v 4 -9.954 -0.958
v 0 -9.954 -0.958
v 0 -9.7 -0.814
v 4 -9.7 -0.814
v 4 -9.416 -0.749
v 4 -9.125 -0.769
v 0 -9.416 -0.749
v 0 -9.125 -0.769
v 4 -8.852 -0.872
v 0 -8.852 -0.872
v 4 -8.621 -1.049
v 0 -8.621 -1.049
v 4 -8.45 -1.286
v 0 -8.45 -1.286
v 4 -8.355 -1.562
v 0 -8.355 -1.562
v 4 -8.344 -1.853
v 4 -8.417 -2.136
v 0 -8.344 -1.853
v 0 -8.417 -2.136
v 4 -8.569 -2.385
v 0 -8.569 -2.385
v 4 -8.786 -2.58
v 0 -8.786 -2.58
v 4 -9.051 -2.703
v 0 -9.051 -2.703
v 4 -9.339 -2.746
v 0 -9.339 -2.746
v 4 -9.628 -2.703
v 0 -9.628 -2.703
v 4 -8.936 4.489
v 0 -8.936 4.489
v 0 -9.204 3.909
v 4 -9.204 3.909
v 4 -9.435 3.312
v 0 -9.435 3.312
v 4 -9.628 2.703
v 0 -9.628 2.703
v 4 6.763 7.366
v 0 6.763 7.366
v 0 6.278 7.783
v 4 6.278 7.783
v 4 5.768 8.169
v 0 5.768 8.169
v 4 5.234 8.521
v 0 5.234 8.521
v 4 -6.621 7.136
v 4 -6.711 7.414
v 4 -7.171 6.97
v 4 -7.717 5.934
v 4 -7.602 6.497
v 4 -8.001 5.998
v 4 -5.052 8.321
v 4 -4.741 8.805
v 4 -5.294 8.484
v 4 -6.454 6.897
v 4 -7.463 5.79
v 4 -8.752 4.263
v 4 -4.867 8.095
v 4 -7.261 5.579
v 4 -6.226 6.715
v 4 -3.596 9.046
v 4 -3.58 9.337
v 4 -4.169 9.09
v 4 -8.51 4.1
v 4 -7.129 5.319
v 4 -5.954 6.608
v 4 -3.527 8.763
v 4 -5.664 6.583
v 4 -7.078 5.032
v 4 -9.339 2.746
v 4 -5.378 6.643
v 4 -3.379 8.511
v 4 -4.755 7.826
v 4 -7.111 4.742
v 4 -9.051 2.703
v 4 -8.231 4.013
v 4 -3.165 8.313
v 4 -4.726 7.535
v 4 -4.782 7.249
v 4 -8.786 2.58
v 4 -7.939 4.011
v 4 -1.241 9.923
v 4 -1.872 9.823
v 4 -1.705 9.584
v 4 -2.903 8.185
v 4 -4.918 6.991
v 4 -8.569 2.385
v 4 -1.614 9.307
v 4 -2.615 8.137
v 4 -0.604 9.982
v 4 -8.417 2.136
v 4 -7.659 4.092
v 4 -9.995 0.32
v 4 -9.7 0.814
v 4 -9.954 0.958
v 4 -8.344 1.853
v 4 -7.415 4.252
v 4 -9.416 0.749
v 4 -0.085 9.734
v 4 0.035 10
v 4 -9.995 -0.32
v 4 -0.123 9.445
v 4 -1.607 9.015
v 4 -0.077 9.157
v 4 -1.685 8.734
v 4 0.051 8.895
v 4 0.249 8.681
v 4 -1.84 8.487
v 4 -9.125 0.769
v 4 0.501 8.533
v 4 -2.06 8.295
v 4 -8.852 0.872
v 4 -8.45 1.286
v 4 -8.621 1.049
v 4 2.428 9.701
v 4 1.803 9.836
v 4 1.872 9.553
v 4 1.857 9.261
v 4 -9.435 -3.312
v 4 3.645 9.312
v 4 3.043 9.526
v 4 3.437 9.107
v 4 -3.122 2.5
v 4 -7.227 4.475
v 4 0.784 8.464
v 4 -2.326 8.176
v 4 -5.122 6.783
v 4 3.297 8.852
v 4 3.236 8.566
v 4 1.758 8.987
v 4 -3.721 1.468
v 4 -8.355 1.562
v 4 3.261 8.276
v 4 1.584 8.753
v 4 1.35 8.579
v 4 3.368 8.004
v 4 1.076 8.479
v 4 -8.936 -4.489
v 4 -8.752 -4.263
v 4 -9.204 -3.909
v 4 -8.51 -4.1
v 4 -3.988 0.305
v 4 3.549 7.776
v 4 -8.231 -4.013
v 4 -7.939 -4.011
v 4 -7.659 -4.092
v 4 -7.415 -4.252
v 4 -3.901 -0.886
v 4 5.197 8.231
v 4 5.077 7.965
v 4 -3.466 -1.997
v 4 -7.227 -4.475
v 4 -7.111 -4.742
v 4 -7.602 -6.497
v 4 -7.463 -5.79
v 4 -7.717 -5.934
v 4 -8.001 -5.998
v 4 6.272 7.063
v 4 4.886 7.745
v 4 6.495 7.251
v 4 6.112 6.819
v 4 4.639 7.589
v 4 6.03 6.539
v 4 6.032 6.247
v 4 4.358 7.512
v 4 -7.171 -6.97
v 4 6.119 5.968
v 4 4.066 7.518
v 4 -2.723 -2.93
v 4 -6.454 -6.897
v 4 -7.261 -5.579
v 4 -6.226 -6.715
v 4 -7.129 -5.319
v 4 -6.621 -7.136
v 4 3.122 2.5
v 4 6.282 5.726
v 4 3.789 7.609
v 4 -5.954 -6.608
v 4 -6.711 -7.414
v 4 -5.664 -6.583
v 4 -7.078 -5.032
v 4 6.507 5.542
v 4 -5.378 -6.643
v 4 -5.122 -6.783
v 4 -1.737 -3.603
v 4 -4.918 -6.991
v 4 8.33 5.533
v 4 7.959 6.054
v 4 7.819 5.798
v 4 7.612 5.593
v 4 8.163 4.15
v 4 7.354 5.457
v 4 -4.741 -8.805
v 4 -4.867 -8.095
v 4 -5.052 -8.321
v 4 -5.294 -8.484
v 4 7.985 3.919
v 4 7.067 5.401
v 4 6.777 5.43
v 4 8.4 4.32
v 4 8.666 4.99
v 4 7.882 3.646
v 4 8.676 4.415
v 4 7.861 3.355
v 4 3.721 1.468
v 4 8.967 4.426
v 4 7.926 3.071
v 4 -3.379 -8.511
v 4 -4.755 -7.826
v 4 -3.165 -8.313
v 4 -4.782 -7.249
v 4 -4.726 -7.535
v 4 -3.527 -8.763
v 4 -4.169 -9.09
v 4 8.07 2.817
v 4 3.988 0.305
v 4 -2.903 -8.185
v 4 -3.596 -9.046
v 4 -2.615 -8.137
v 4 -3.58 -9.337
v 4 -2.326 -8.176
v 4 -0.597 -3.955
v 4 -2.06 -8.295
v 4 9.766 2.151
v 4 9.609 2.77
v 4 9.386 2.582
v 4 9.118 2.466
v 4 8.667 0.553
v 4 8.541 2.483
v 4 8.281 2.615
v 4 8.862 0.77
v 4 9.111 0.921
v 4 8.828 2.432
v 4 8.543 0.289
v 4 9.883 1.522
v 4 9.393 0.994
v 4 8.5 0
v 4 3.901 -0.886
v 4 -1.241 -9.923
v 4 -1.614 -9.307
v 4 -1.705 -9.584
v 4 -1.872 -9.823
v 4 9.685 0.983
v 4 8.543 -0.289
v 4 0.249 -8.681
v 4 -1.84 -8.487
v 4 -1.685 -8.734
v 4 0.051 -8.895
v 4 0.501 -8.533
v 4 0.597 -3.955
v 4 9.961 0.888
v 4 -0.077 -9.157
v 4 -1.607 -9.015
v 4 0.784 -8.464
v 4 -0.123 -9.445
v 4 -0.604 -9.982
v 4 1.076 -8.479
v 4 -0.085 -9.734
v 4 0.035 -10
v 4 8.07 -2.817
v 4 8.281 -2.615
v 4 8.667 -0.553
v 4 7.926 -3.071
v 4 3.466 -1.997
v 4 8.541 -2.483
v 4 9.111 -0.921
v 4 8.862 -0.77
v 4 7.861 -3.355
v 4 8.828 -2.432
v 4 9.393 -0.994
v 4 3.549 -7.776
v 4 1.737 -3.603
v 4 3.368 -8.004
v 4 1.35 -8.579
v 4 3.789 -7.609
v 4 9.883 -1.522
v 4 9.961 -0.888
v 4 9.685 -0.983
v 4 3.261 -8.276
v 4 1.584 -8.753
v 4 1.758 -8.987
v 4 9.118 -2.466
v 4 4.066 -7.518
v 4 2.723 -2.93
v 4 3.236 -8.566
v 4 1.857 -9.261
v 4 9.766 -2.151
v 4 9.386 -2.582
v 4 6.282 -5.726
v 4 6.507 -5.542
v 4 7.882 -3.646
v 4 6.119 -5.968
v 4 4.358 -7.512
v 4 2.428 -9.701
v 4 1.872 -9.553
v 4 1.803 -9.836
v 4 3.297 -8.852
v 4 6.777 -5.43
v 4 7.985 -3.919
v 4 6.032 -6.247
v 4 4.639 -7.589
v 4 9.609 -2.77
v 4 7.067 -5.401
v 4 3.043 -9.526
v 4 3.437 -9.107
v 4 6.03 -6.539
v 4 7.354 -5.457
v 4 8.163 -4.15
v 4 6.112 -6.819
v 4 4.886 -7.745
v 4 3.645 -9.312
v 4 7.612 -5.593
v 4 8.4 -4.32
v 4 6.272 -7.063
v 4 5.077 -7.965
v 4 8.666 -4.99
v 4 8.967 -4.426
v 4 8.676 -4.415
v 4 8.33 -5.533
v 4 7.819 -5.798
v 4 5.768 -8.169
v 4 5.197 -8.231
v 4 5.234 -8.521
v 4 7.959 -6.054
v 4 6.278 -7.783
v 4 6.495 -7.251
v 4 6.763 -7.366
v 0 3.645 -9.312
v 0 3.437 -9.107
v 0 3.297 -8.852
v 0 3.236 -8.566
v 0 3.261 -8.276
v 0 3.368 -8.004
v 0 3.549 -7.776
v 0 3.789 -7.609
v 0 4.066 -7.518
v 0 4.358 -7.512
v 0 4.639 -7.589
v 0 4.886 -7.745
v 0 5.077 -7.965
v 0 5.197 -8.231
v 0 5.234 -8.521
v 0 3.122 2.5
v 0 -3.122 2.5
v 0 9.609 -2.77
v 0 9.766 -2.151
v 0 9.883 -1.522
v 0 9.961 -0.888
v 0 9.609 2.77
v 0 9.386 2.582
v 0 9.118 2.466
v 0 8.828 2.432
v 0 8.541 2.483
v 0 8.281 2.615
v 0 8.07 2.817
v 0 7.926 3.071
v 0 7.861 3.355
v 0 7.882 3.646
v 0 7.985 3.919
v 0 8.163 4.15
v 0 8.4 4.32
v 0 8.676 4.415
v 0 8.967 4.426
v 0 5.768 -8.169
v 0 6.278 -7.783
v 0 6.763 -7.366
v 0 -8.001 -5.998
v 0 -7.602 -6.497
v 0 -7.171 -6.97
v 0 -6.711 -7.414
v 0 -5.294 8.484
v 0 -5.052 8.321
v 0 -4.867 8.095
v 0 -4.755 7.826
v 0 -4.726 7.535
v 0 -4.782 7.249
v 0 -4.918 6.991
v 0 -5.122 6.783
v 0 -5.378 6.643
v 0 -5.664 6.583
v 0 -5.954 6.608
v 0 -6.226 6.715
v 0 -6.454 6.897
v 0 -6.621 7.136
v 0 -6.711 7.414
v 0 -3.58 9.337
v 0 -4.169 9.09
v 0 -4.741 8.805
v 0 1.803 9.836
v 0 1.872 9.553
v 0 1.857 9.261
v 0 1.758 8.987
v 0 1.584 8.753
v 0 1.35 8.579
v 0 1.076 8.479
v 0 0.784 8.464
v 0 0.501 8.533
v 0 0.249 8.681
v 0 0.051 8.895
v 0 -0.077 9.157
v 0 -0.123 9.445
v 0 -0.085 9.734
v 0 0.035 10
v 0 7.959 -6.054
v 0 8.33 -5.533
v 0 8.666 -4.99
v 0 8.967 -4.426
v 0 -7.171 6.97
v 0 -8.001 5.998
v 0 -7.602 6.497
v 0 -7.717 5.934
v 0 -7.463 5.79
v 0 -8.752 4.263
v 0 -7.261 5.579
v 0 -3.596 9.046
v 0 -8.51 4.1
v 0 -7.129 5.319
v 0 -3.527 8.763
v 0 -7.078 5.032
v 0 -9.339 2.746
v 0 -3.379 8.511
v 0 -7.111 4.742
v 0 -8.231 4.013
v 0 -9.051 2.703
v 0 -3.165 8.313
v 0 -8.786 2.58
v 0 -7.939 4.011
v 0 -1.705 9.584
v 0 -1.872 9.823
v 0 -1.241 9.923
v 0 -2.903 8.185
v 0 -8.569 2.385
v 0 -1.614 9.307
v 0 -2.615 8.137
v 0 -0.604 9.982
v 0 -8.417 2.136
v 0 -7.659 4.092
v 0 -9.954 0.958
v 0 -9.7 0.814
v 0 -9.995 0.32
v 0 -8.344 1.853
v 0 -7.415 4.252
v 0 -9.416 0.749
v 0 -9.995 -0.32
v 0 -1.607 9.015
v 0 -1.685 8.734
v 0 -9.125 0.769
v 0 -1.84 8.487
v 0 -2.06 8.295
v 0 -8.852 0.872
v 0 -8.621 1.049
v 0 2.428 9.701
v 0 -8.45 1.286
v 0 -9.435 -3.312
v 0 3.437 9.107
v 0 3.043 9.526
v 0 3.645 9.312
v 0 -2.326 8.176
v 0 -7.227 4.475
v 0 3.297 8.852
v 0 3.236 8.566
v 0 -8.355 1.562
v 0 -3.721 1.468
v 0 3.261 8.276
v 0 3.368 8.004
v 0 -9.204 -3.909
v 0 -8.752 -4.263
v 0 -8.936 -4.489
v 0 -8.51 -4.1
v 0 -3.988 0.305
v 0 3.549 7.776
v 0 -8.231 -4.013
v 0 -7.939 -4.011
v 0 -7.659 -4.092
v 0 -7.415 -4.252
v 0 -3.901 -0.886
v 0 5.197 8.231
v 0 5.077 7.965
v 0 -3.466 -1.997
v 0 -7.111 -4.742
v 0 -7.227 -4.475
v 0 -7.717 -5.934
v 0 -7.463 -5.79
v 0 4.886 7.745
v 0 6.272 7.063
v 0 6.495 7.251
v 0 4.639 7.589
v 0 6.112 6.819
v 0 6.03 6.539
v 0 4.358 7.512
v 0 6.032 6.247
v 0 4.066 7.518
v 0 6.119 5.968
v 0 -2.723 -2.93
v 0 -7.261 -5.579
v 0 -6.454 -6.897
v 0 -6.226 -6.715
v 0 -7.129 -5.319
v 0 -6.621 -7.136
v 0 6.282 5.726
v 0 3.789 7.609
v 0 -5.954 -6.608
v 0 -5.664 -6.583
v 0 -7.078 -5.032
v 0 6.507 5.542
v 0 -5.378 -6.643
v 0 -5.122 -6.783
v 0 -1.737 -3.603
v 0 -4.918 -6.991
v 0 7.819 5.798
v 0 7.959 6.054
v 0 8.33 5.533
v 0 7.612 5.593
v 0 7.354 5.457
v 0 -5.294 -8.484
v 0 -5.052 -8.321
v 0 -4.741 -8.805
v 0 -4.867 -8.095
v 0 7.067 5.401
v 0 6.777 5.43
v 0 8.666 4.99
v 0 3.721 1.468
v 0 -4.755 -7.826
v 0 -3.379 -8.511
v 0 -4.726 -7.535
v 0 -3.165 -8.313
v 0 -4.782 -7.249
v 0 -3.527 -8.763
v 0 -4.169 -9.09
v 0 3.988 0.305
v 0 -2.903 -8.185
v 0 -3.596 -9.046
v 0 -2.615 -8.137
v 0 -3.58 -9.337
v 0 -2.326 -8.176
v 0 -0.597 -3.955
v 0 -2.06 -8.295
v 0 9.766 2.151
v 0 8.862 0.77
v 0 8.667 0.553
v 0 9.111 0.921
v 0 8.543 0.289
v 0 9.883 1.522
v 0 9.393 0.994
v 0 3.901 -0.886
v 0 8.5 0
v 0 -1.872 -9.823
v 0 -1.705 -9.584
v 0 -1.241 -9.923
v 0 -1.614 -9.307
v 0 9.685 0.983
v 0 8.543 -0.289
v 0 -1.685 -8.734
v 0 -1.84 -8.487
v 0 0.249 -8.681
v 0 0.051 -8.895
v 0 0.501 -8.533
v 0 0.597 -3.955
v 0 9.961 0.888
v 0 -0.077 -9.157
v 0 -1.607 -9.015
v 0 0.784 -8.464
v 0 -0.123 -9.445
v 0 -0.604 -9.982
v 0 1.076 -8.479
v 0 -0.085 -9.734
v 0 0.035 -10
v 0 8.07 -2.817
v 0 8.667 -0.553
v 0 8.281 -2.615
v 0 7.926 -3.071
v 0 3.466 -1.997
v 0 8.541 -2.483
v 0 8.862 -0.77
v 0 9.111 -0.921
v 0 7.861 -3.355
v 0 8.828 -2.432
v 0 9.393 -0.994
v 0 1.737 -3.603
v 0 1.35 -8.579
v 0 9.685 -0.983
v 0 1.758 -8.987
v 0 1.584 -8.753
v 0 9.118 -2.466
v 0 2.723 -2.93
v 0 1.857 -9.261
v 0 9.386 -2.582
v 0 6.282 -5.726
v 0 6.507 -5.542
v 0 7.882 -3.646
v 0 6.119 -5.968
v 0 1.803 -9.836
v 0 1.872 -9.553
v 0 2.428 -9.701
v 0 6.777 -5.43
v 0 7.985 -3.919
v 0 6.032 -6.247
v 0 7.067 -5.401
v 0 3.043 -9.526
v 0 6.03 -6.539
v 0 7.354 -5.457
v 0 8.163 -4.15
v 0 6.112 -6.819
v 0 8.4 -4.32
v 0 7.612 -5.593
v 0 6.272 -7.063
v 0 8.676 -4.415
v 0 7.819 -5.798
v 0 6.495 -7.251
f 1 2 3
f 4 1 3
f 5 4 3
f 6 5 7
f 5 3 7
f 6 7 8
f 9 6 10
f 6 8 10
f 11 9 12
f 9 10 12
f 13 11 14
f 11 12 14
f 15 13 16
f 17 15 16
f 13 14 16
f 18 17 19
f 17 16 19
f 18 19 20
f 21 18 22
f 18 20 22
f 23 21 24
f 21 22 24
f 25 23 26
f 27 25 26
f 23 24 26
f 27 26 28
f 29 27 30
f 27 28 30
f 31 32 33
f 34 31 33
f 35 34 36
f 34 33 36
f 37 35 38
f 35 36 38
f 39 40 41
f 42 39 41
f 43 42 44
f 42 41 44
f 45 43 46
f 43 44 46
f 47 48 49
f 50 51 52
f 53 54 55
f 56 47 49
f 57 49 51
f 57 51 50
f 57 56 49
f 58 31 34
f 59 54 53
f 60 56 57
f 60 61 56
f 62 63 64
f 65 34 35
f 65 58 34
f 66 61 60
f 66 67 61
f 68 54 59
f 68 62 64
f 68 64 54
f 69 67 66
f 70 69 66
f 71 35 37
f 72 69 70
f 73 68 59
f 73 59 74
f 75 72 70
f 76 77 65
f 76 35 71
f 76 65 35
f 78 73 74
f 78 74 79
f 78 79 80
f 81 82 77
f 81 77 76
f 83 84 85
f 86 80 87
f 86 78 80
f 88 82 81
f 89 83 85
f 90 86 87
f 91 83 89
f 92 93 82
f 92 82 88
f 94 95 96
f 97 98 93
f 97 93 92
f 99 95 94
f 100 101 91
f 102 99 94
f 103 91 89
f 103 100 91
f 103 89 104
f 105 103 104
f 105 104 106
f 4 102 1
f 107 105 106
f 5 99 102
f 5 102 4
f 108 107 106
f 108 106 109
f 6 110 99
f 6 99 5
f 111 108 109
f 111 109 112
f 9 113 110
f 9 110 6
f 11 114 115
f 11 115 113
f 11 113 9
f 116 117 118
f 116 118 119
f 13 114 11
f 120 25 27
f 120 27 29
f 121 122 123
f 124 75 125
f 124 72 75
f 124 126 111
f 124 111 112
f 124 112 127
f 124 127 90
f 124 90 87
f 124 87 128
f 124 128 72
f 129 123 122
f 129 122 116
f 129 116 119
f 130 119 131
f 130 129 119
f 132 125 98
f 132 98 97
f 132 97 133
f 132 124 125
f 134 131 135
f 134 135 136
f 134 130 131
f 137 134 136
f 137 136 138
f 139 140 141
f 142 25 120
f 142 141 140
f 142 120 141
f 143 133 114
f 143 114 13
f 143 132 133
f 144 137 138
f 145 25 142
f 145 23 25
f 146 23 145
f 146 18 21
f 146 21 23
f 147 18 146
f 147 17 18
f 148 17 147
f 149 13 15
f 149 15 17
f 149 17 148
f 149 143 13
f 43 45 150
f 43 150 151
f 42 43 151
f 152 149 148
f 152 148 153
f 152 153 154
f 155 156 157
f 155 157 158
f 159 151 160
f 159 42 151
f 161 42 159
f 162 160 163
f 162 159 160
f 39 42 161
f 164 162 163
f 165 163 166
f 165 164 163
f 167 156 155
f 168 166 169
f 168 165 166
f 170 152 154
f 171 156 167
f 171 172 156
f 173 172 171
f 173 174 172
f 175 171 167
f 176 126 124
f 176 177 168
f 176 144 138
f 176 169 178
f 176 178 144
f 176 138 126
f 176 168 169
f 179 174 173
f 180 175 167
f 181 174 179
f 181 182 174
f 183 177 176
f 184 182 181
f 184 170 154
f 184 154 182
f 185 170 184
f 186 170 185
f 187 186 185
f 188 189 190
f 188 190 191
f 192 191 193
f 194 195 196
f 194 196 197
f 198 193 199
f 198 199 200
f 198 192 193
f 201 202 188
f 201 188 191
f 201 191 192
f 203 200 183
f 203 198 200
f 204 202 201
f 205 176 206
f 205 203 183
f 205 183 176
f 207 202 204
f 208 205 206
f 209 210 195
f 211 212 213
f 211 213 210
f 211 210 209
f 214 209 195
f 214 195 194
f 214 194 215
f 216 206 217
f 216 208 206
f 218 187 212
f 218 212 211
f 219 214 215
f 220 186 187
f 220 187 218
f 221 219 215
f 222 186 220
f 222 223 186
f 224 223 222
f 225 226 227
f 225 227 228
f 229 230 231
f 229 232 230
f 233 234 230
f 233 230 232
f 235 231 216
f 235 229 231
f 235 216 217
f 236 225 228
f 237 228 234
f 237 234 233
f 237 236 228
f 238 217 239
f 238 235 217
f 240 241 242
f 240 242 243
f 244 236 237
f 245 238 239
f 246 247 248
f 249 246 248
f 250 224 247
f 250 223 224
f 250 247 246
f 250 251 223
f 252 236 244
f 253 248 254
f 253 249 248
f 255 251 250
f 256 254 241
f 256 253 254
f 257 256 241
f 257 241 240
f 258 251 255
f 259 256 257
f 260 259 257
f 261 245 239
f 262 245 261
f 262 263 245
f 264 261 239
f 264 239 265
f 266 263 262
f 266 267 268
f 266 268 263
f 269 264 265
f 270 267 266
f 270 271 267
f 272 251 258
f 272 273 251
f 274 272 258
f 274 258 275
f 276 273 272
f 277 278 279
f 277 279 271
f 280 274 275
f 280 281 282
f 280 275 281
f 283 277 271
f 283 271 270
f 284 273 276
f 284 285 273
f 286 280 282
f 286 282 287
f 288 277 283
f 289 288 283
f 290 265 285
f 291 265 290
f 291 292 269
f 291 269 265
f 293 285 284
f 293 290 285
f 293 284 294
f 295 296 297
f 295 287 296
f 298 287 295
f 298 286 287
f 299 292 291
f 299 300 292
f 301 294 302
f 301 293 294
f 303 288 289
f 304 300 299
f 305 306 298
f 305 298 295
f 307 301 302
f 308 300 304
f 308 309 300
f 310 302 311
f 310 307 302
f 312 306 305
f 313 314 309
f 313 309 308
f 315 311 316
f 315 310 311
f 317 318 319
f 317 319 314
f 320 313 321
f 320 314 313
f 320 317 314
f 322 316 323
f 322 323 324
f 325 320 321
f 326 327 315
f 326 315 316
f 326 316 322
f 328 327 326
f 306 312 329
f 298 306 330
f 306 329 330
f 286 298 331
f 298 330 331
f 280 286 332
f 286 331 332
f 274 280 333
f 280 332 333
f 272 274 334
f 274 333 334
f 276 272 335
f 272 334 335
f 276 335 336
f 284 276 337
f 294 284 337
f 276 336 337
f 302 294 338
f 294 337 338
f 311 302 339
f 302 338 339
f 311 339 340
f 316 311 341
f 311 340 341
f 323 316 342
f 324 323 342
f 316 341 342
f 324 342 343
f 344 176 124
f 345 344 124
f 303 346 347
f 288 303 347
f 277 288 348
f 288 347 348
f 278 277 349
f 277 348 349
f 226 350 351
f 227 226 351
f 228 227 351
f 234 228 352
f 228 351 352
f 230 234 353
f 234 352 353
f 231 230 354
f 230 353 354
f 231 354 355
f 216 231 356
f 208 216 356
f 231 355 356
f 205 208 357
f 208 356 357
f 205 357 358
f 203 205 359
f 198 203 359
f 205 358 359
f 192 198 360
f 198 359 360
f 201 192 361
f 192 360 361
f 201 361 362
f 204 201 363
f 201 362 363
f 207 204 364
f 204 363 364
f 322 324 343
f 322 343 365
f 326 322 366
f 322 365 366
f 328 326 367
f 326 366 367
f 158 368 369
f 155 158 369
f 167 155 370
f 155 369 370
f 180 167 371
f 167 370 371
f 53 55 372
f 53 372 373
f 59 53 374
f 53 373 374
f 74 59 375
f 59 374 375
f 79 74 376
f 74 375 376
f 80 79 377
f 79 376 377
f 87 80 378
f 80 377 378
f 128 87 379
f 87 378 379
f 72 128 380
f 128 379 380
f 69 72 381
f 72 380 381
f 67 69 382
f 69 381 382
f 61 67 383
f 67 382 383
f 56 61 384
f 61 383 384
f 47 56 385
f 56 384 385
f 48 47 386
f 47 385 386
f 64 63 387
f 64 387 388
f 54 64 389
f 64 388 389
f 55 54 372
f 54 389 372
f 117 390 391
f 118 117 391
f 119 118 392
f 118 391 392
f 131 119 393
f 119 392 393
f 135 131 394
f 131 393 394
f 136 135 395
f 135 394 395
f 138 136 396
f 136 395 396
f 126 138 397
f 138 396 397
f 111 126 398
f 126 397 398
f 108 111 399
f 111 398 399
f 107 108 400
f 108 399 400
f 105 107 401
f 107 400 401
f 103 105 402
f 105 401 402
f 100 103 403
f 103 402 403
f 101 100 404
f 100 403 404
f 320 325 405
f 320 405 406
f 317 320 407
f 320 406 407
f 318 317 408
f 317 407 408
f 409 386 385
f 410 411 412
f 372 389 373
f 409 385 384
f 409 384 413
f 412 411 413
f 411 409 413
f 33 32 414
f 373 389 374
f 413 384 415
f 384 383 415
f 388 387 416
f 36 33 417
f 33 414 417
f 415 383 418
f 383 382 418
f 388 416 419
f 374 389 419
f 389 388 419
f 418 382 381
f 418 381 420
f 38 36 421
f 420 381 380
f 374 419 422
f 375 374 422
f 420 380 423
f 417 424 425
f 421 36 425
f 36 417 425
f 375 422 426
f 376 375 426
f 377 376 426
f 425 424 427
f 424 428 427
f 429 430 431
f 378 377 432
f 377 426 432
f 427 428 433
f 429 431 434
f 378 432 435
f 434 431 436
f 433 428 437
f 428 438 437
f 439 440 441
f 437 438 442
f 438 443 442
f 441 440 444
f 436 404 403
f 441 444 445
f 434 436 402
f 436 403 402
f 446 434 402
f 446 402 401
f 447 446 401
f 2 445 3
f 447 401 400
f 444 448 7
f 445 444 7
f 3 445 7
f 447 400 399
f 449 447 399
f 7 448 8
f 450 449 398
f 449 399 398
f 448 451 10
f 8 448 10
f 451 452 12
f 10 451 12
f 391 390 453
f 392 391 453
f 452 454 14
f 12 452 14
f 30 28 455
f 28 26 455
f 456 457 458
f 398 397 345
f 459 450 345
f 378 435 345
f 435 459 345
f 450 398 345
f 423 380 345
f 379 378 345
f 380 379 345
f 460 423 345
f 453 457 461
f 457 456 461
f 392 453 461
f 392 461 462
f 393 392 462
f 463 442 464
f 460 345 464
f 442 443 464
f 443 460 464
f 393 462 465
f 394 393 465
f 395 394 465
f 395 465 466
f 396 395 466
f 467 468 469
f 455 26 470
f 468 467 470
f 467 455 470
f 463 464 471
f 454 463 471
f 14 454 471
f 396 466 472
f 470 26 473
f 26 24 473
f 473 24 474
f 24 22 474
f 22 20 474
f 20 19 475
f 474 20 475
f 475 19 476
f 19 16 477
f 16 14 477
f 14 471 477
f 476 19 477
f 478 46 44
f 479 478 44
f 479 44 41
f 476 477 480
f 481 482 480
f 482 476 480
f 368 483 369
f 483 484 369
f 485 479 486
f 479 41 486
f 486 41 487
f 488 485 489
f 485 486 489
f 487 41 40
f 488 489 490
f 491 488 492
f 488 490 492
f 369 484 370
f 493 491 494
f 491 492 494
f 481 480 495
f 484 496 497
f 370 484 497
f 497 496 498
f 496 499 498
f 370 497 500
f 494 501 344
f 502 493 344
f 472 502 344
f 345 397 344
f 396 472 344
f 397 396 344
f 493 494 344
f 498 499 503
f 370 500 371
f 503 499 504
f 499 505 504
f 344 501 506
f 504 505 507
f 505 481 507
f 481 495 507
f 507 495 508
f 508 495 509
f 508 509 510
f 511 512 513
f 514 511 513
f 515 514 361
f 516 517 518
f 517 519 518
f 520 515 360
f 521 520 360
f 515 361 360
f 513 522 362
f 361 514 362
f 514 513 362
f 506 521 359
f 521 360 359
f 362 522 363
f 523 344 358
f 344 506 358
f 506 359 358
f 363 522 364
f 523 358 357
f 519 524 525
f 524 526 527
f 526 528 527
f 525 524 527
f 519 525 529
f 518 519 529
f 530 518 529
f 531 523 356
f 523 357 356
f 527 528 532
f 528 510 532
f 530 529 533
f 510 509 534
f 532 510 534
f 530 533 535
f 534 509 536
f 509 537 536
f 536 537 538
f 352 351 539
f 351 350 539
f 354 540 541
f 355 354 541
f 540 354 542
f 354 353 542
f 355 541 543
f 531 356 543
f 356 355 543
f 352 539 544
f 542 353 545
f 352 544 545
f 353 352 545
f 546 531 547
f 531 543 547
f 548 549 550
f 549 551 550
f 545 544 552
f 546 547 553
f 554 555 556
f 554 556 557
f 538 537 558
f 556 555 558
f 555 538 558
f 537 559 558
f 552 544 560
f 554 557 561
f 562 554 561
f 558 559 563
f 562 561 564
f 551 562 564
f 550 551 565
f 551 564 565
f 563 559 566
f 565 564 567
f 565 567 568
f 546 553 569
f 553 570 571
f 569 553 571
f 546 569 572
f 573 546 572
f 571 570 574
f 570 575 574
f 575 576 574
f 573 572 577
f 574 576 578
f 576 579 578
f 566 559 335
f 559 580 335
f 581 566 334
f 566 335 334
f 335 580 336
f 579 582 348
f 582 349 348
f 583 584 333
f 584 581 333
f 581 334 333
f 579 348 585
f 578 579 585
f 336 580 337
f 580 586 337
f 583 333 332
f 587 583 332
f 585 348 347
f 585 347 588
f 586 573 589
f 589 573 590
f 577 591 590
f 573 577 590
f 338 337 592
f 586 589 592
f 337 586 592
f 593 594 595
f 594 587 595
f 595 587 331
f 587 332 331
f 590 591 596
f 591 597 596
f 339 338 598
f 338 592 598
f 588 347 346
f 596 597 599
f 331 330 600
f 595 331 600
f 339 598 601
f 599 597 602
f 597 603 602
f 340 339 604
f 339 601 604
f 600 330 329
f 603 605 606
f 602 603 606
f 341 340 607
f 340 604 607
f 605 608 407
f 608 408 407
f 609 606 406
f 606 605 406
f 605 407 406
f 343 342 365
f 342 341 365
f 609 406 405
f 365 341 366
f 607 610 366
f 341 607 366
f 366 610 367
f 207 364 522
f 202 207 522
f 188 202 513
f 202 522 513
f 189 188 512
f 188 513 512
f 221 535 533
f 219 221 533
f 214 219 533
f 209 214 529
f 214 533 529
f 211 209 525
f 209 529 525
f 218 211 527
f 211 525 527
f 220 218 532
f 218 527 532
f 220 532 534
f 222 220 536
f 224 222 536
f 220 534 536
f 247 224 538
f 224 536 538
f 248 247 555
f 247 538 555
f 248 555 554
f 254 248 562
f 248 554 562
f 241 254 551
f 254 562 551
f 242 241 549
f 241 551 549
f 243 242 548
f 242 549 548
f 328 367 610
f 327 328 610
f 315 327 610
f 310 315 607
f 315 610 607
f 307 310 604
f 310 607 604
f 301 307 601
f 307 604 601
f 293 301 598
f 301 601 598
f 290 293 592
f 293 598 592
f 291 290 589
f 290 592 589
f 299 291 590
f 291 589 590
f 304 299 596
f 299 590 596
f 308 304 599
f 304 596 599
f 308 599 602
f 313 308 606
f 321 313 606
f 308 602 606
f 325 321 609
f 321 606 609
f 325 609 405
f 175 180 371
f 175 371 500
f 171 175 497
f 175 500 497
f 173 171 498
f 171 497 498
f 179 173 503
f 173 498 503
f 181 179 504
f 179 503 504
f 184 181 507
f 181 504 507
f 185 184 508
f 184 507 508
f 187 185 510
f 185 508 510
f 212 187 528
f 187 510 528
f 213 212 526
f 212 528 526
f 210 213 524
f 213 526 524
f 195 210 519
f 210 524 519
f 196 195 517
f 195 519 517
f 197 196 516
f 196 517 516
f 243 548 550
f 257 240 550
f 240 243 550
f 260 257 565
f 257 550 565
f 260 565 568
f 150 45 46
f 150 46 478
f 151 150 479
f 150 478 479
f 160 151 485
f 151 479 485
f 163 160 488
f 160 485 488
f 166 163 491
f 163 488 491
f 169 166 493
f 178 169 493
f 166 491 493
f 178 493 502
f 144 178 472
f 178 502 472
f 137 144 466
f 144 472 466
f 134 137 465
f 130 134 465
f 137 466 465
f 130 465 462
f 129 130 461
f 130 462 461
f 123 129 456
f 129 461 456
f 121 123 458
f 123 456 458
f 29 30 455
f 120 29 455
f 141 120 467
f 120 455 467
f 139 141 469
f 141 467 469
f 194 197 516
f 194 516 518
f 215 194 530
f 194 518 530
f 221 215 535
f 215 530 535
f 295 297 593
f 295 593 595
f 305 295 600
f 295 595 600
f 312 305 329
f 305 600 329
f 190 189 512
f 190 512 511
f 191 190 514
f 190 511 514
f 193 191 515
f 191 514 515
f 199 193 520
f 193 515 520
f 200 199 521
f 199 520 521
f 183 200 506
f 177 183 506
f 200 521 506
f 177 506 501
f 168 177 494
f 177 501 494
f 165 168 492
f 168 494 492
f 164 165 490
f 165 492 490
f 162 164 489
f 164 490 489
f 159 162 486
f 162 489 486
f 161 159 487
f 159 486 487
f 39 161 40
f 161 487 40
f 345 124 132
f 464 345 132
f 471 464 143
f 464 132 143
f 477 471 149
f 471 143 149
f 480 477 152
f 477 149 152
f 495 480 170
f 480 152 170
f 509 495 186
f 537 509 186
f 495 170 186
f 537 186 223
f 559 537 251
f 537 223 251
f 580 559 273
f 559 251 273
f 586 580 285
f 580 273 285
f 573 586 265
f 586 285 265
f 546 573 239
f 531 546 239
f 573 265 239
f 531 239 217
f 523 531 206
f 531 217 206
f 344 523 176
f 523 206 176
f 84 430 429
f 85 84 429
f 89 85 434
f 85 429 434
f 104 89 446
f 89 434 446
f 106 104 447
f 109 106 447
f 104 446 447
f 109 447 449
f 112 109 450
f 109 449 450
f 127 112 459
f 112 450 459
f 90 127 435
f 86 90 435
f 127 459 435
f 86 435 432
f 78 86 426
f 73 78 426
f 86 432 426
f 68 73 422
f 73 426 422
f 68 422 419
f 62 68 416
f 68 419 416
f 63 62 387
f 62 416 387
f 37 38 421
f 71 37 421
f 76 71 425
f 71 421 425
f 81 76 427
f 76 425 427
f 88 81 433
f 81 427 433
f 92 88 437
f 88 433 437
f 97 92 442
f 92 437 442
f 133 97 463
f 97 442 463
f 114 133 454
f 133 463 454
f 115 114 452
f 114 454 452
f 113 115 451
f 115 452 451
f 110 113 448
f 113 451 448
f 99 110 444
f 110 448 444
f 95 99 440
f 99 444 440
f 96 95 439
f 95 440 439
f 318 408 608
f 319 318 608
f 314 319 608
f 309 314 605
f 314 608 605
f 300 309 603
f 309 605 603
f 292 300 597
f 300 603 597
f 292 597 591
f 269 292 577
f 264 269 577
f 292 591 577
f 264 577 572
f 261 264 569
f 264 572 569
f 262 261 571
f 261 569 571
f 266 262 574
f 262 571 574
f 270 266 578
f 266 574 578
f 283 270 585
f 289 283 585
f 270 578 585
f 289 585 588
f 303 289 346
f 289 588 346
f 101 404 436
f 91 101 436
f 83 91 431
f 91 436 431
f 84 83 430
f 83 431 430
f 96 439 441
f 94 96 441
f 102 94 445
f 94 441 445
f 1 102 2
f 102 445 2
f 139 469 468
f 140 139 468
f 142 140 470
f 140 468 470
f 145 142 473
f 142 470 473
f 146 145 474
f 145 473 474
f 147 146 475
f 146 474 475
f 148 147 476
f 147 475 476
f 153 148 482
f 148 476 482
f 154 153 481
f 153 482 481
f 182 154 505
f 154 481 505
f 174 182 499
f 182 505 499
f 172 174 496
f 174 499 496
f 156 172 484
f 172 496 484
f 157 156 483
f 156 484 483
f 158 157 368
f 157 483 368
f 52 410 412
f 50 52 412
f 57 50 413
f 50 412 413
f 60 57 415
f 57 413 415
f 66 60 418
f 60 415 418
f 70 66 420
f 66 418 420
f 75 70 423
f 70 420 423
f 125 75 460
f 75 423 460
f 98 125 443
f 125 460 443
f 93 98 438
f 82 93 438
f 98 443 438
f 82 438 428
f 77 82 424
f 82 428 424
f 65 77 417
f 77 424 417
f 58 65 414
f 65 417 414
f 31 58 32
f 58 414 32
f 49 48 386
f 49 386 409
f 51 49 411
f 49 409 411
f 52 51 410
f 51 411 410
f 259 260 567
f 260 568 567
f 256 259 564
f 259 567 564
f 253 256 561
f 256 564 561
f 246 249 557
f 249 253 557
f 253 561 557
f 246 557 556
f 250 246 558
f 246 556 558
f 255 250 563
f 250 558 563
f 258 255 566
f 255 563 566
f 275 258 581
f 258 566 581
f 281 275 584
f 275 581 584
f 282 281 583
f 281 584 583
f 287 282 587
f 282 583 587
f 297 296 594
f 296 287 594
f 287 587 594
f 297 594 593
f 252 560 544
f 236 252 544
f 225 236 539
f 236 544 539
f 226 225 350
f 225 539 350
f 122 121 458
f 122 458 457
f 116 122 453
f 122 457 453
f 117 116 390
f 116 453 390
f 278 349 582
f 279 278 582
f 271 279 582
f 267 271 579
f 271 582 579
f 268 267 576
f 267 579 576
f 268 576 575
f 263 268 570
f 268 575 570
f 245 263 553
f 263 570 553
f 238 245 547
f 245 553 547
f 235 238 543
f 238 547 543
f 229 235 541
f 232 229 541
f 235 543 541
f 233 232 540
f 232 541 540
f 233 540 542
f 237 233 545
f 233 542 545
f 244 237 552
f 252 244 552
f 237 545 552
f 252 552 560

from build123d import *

# Parameters (mm, degrees)
SKETCH_1_R          = 10
EXTRUDE_2_DEPTH     = 4
SKETCH_2_R          = 1
CUT_EXTRUDE_1_DEPTH = 4
CUT_EXTRUDE_2_DEPTH = 4


with BuildPart() as part:
    # Эскиз1 → Бобышка-Вытянуть2 (new body)
    with BuildSketch(Plane(origin=(0, 0, 0), x_dir=(0, 0, -1), z_dir=(1, 0, 0))):
        Circle(SKETCH_1_R)
    extrude(amount=EXTRUDE_2_DEPTH)

    # Эскиз2 → Вырез-Вытянуть1 (cut)
    with BuildSketch(Plane.ZY):
        with Locations((0, 9.5)):
            Circle(SKETCH_2_R)
        with Locations((3.431795829, 8.858486179)):
            Circle(SKETCH_2_R)
        with Locations((6.400108615, 7.020584714)):
            Circle(SKETCH_2_R)
        with Locations((8.504051268, 4.23451438)):
            Circle(SKETCH_2_R)
        with Locations((9.459474675, 0.876549415)):
            Circle(SKETCH_2_R)
        with Locations((9.13734361, -2.599798406)):
            Circle(SKETCH_2_R)
        with Locations((7.581163659, -5.725029046)):
            Circle(SKETCH_2_R)
        with Locations((5.001105547, -8.077062789)):
            Circle(SKETCH_2_R)
        with Locations((1.745620419, -9.338244447)):
            Circle(SKETCH_2_R)
        with Locations((-1.745620419, -9.338244447)):
            Circle(SKETCH_2_R)
        with Locations((-5.001105547, -8.077062789)):
            Circle(SKETCH_2_R)
        with Locations((-7.581163659, -5.725029046)):
            Circle(SKETCH_2_R)
        with Locations((-9.13734361, -2.599798406)):
            Circle(SKETCH_2_R)
        with Locations((-9.459474675, 0.876549415)):
            Circle(SKETCH_2_R)
        with Locations((-8.504051268, 4.23451438)):
            Circle(SKETCH_2_R)
        with Locations((-6.400108615, 7.020584714)):
            Circle(SKETCH_2_R)
        with Locations((-3.431795829, 8.858486179)):
            Circle(SKETCH_2_R)
    extrude(amount=-CUT_EXTRUDE_1_DEPTH, mode=Mode.SUBTRACT)

    # Эскиз3 → Вырез-Вытянуть2 (cut)
    with BuildSketch(Plane(origin=(4, 0, 0), x_dir=(0, 0, -1), z_dir=(1, 0, 0))):
        with BuildLine():
            Line((-2.5, 3.122498999), (-2.5, -3.122498999))
            ThreePointArc((-2.5, -3.122498999), (4, 0), (-2.5, 3.122498999))
        make_face()
    extrude(amount=-CUT_EXTRUDE_2_DEPTH, mode=Mode.SUBTRACT)


solid = part.part
